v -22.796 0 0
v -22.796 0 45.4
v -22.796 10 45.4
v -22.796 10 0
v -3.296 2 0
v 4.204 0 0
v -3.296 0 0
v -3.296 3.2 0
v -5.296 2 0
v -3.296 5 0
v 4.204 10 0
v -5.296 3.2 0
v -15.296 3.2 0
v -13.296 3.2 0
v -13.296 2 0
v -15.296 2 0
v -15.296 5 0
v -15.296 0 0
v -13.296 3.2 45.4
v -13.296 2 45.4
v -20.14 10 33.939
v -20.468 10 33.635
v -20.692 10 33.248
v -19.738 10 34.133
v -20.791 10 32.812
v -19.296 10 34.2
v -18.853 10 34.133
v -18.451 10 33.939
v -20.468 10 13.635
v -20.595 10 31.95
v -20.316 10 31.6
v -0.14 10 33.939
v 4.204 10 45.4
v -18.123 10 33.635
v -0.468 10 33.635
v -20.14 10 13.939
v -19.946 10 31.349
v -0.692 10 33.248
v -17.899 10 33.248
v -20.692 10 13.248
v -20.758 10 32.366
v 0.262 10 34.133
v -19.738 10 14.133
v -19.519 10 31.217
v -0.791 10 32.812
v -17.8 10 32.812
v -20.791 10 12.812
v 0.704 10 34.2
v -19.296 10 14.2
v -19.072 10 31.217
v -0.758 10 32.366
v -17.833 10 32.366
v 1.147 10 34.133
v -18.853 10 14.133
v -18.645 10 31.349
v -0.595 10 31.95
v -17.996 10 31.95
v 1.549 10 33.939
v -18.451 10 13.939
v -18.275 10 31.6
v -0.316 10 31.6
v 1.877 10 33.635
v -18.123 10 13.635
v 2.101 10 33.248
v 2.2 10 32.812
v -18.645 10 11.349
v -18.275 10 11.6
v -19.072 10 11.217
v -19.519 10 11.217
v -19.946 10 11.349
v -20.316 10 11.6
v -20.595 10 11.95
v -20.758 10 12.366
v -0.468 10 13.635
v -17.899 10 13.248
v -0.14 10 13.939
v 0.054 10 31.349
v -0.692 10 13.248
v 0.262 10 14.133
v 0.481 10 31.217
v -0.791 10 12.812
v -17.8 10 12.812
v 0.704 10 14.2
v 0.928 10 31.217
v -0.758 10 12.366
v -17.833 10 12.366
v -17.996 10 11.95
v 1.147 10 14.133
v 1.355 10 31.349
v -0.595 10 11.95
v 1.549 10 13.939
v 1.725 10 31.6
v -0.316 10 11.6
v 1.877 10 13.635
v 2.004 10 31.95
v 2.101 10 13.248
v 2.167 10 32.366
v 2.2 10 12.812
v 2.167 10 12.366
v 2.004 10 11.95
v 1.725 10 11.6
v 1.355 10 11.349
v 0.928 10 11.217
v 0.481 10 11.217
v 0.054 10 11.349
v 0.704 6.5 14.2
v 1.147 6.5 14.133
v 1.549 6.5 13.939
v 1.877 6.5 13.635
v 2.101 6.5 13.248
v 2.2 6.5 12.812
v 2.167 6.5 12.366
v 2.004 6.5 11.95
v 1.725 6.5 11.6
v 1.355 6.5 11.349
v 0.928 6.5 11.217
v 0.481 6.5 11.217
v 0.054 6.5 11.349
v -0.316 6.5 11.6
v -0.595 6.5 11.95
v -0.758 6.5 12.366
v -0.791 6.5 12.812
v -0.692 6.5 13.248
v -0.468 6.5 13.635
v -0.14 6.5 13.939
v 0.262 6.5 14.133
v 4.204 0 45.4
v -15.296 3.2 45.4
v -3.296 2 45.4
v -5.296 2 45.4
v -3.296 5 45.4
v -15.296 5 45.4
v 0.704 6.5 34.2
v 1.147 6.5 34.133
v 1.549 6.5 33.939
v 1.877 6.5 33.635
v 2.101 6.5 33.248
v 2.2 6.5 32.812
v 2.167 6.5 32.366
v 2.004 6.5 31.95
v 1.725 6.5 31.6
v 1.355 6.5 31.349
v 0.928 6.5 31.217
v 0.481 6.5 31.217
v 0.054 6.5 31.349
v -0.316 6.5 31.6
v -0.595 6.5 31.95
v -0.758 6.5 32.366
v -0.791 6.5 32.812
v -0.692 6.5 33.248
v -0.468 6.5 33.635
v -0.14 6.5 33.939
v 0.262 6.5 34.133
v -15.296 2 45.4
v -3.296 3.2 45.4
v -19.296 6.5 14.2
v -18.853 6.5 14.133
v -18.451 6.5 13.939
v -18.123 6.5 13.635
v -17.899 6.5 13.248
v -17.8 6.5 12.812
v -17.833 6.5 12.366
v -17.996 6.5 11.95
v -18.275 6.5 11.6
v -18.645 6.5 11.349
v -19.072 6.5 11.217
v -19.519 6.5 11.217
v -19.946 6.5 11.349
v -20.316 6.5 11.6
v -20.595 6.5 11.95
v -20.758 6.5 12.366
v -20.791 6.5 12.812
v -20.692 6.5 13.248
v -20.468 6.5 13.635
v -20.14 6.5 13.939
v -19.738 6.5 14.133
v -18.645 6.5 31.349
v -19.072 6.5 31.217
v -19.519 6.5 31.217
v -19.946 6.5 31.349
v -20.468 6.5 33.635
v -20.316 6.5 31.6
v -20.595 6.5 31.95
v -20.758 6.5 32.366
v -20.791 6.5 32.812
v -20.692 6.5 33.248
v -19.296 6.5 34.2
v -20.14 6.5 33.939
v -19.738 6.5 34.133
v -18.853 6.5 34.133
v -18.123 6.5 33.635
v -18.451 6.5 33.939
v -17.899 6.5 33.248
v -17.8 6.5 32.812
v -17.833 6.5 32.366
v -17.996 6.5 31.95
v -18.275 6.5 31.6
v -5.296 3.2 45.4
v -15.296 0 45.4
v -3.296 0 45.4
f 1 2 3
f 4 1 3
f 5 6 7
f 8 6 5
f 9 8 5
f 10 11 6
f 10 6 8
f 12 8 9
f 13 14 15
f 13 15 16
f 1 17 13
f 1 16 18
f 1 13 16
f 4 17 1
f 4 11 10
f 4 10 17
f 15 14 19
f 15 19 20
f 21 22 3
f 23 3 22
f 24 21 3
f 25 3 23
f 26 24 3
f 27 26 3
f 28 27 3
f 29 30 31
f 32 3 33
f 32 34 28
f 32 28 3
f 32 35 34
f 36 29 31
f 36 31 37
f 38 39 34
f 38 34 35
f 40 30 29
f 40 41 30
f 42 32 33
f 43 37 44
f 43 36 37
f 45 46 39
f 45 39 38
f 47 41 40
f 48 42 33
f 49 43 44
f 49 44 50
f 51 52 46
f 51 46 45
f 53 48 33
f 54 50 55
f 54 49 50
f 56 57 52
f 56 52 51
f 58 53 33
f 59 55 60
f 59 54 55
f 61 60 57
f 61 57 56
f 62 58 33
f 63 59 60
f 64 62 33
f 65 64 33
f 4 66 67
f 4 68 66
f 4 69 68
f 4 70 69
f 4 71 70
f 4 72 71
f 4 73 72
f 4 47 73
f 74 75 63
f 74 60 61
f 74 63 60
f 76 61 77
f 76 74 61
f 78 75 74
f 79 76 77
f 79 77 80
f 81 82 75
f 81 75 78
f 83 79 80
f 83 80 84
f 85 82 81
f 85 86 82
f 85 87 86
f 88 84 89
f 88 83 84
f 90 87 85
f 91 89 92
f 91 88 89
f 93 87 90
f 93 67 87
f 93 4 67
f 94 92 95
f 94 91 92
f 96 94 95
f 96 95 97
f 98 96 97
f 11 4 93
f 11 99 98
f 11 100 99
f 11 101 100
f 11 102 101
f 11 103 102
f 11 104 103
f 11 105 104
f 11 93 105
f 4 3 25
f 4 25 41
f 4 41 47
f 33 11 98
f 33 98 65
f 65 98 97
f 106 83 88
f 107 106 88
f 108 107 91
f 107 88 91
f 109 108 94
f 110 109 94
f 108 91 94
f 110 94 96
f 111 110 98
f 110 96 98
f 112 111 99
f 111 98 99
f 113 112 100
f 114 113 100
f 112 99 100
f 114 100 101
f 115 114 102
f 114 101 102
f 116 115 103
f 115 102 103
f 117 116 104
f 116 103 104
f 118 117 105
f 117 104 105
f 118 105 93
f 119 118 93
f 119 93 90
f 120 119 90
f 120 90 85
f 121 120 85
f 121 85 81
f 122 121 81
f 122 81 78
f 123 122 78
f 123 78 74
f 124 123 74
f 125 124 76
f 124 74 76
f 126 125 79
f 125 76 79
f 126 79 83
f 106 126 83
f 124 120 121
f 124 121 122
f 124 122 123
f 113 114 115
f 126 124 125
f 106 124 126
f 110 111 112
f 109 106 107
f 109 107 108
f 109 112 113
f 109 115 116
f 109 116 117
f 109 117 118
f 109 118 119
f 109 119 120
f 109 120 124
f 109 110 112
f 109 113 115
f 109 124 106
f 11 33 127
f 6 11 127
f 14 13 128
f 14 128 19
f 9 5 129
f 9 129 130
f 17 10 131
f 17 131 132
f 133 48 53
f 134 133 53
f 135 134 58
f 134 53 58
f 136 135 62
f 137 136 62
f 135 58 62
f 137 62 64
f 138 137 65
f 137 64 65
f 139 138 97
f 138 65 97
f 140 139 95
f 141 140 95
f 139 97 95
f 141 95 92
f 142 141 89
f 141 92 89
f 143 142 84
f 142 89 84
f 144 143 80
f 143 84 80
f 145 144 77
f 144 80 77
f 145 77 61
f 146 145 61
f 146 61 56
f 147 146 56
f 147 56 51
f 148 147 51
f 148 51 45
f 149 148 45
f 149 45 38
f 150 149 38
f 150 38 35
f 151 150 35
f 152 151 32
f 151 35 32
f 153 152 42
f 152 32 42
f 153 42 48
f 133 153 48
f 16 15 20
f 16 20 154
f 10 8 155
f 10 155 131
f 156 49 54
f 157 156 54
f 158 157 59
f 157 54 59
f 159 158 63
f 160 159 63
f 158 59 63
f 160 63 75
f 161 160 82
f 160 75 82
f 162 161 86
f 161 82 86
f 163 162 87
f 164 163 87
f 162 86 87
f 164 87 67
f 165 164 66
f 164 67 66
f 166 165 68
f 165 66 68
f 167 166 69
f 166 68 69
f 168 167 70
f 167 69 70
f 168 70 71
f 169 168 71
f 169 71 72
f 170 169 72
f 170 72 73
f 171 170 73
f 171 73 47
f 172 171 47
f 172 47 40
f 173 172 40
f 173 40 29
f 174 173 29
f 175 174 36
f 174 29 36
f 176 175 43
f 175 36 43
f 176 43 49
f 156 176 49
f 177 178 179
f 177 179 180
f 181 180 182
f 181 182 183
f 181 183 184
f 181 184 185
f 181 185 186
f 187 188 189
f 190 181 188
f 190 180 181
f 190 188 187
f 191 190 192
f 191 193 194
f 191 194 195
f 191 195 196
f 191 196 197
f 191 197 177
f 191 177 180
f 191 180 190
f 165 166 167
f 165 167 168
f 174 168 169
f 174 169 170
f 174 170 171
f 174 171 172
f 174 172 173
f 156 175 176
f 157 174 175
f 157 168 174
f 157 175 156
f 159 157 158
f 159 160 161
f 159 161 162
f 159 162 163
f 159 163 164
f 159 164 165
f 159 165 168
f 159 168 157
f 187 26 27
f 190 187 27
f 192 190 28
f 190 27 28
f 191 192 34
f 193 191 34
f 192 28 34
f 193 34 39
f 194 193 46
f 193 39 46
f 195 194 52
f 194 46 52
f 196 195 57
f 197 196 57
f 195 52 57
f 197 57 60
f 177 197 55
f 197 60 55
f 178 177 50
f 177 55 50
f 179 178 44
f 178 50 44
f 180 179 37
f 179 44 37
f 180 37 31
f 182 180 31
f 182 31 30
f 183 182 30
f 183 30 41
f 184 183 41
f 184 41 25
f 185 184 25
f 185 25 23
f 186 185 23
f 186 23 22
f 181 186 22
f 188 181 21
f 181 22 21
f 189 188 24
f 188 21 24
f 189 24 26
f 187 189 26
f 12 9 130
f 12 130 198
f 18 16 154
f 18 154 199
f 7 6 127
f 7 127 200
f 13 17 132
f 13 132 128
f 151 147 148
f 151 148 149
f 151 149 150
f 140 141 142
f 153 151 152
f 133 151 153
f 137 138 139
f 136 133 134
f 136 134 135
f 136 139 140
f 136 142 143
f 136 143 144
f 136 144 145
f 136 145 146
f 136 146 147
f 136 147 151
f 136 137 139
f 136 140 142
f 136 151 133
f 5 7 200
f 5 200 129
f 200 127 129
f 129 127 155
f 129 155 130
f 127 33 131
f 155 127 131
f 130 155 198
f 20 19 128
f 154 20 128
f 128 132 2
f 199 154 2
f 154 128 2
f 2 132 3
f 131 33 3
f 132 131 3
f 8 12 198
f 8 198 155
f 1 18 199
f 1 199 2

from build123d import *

# Parameters (mm, degrees)
BOSS_EXTRU_1_DEPTH      = 45.4
ESQUISSE2_R             = 1.5
ENL_V_MAT_EXTRU_1_DEPTH = 3.5


with BuildPart() as part:
    # Esquisse1 → Boss.-Extru.1 (new body)
    with BuildSketch(Plane.XY):
        Polygon((-22.795509579, 10), (4.204490421, 10), (4.204490421, 0), (-3.295509579, 0), (-3.295509579, 2), (-5.295509579, 2), (-5.295509579, 3.2), (-3.295509579, 3.2), (-3.295509579, 5), (-15.295509579, 5), (-15.295509579, 3.2), (-13.295509579, 3.2), (-13.295509579, 2), (-15.295509579, 2), (-15.295509579, 0), (-22.795509579, 0), align=None)
    extrude(amount=BOSS_EXTRU_1_DEPTH)

    # Esquisse2 → Enlèv. mat.-Extru.1 (cut)
    with BuildSketch(Plane(origin=(0, 10, 0), x_dir=(1, 0, 0), z_dir=(0, 1, 0))):
        with Locations(Location((-19.295509579, -32.7, 0), (0, 0, 270))):
            Circle(ESQUISSE2_R)
        with Locations(Location((-19.295509579, -12.7, 0), (0, 0, 270))):
            Circle(ESQUISSE2_R)
        with Locations(Location((0.704490421, -12.7, 0), (0, 0, 270))):
            Circle(ESQUISSE2_R)
        with Locations(Location((0.704490421, -32.7, 0), (0, 0, 270))):
            Circle(ESQUISSE2_R)
    extrude(amount=-ENL_V_MAT_EXTRU_1_DEPTH, mode=Mode.SUBTRACT)


solid = part.part
